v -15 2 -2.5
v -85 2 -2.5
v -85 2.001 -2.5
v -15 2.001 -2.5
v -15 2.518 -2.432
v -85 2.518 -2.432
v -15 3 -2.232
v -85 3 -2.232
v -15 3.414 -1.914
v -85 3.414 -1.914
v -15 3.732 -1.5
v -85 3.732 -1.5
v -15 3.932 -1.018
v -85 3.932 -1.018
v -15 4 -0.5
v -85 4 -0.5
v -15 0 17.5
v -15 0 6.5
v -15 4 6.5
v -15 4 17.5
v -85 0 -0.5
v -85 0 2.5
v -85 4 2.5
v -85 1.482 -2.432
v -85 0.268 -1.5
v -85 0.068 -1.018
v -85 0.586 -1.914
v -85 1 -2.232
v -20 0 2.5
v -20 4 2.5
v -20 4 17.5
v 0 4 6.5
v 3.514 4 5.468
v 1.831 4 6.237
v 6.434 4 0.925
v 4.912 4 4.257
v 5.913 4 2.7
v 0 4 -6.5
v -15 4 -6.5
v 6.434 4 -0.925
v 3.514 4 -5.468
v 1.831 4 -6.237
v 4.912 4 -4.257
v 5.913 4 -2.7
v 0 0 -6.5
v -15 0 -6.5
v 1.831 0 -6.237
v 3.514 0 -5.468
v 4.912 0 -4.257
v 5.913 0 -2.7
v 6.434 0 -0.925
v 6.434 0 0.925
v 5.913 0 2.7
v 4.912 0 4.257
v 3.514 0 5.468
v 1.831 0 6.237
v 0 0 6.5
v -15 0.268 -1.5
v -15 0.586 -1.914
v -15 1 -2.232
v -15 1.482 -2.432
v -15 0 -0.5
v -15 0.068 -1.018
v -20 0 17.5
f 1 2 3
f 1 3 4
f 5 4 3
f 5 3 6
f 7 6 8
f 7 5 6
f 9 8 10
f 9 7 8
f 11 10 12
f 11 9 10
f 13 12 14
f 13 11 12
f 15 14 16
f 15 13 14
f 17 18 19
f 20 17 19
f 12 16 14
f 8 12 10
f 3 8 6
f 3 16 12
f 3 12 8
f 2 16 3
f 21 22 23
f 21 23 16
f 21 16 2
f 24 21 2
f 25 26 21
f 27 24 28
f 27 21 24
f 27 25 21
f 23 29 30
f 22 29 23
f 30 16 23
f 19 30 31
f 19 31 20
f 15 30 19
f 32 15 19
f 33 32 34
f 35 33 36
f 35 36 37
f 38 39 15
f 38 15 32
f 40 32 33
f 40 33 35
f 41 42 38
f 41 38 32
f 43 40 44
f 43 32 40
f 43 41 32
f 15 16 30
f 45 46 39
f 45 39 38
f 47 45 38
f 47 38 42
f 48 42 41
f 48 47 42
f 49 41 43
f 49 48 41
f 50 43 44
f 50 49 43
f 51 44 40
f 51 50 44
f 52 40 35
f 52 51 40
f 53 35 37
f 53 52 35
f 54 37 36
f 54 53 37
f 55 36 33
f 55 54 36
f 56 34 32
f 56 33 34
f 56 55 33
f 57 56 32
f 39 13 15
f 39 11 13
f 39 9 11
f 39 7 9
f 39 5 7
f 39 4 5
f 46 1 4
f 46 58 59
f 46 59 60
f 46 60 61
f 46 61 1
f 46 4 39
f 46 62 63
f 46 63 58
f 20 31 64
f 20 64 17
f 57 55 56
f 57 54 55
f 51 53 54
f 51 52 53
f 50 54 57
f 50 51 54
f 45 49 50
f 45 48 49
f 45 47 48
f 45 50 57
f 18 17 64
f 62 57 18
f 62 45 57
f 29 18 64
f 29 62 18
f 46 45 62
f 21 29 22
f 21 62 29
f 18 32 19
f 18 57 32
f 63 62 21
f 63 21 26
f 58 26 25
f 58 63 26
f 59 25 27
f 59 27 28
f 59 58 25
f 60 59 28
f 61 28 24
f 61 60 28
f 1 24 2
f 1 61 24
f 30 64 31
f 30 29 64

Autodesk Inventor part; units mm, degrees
ref_plane "YZ Plane" through (0, 0, 0) normal (1, 0, 0) x (0, 1, 0)
ref_plane "XZ Plane" through (0, 0, 0) normal (0, 1, 0) x (-1, 0, 0)
ref_plane "XY Plane" through (0, 0, 0) normal (0, 0, 1) x (1, 0, 0)
sketch "Sketch1" plane through (0, 0, 0) normal (0, 1, 0) x (-1, 0, 0)
  circle A0 centre (0, 0) radius 6.5
  line L0 (0, 6.5) -> (15, 6.5)
  line L1 (15, 6.5) -> (15, -6.5)
  line L2 (15, -6.5) -> (0, -6.5)
  line L3 (0, -6.5) -> (0, 6.5)
  line L4 (15, 2.5) -> (85, 2.5)
  line L5 (85, 2.5) -> (85, -2.5)
  line L6 (85, -2.5) -> (15, -2.5)
  line L7 (15, -2.5) -> (15, 2.5)
  dimension "d0" = 13
  dimension "d1" = 6.5
  dimension "d2" = 15
  dimension "d3" = 6.5
  dimension "d4" = 70
  dimension "d5" = 4
  dimension "d6" = 4
extrude "Extrusion1" add sketch "Sketch1" along normal blind 4
fillet "Fillet1" radius 2 2 edges at (-50, 4, -2.5) (-50, 0, -2.5)
sketch "Sketch2" plane through (-85, 0, 2.5) normal (0, 0, 1) x (1, 0, 0)
  line L0 (70, 0) -> (70, 4) projected
  line L1 (0, 4) -> (70, 4) projected
  line L2 (70, 0) -> (65, 0)
  line L3 (65, 0) -> (65, 4)
  line L4 (65, 4) -> (70, 4)
  line L5 (70, 4) -> (70, 0)
  point P0 (85, 0)
  dimension "d10" = 5
extrude "Extrusion2" add sketch "Sketch2" along normal blind 15
properties part number "Arms"
